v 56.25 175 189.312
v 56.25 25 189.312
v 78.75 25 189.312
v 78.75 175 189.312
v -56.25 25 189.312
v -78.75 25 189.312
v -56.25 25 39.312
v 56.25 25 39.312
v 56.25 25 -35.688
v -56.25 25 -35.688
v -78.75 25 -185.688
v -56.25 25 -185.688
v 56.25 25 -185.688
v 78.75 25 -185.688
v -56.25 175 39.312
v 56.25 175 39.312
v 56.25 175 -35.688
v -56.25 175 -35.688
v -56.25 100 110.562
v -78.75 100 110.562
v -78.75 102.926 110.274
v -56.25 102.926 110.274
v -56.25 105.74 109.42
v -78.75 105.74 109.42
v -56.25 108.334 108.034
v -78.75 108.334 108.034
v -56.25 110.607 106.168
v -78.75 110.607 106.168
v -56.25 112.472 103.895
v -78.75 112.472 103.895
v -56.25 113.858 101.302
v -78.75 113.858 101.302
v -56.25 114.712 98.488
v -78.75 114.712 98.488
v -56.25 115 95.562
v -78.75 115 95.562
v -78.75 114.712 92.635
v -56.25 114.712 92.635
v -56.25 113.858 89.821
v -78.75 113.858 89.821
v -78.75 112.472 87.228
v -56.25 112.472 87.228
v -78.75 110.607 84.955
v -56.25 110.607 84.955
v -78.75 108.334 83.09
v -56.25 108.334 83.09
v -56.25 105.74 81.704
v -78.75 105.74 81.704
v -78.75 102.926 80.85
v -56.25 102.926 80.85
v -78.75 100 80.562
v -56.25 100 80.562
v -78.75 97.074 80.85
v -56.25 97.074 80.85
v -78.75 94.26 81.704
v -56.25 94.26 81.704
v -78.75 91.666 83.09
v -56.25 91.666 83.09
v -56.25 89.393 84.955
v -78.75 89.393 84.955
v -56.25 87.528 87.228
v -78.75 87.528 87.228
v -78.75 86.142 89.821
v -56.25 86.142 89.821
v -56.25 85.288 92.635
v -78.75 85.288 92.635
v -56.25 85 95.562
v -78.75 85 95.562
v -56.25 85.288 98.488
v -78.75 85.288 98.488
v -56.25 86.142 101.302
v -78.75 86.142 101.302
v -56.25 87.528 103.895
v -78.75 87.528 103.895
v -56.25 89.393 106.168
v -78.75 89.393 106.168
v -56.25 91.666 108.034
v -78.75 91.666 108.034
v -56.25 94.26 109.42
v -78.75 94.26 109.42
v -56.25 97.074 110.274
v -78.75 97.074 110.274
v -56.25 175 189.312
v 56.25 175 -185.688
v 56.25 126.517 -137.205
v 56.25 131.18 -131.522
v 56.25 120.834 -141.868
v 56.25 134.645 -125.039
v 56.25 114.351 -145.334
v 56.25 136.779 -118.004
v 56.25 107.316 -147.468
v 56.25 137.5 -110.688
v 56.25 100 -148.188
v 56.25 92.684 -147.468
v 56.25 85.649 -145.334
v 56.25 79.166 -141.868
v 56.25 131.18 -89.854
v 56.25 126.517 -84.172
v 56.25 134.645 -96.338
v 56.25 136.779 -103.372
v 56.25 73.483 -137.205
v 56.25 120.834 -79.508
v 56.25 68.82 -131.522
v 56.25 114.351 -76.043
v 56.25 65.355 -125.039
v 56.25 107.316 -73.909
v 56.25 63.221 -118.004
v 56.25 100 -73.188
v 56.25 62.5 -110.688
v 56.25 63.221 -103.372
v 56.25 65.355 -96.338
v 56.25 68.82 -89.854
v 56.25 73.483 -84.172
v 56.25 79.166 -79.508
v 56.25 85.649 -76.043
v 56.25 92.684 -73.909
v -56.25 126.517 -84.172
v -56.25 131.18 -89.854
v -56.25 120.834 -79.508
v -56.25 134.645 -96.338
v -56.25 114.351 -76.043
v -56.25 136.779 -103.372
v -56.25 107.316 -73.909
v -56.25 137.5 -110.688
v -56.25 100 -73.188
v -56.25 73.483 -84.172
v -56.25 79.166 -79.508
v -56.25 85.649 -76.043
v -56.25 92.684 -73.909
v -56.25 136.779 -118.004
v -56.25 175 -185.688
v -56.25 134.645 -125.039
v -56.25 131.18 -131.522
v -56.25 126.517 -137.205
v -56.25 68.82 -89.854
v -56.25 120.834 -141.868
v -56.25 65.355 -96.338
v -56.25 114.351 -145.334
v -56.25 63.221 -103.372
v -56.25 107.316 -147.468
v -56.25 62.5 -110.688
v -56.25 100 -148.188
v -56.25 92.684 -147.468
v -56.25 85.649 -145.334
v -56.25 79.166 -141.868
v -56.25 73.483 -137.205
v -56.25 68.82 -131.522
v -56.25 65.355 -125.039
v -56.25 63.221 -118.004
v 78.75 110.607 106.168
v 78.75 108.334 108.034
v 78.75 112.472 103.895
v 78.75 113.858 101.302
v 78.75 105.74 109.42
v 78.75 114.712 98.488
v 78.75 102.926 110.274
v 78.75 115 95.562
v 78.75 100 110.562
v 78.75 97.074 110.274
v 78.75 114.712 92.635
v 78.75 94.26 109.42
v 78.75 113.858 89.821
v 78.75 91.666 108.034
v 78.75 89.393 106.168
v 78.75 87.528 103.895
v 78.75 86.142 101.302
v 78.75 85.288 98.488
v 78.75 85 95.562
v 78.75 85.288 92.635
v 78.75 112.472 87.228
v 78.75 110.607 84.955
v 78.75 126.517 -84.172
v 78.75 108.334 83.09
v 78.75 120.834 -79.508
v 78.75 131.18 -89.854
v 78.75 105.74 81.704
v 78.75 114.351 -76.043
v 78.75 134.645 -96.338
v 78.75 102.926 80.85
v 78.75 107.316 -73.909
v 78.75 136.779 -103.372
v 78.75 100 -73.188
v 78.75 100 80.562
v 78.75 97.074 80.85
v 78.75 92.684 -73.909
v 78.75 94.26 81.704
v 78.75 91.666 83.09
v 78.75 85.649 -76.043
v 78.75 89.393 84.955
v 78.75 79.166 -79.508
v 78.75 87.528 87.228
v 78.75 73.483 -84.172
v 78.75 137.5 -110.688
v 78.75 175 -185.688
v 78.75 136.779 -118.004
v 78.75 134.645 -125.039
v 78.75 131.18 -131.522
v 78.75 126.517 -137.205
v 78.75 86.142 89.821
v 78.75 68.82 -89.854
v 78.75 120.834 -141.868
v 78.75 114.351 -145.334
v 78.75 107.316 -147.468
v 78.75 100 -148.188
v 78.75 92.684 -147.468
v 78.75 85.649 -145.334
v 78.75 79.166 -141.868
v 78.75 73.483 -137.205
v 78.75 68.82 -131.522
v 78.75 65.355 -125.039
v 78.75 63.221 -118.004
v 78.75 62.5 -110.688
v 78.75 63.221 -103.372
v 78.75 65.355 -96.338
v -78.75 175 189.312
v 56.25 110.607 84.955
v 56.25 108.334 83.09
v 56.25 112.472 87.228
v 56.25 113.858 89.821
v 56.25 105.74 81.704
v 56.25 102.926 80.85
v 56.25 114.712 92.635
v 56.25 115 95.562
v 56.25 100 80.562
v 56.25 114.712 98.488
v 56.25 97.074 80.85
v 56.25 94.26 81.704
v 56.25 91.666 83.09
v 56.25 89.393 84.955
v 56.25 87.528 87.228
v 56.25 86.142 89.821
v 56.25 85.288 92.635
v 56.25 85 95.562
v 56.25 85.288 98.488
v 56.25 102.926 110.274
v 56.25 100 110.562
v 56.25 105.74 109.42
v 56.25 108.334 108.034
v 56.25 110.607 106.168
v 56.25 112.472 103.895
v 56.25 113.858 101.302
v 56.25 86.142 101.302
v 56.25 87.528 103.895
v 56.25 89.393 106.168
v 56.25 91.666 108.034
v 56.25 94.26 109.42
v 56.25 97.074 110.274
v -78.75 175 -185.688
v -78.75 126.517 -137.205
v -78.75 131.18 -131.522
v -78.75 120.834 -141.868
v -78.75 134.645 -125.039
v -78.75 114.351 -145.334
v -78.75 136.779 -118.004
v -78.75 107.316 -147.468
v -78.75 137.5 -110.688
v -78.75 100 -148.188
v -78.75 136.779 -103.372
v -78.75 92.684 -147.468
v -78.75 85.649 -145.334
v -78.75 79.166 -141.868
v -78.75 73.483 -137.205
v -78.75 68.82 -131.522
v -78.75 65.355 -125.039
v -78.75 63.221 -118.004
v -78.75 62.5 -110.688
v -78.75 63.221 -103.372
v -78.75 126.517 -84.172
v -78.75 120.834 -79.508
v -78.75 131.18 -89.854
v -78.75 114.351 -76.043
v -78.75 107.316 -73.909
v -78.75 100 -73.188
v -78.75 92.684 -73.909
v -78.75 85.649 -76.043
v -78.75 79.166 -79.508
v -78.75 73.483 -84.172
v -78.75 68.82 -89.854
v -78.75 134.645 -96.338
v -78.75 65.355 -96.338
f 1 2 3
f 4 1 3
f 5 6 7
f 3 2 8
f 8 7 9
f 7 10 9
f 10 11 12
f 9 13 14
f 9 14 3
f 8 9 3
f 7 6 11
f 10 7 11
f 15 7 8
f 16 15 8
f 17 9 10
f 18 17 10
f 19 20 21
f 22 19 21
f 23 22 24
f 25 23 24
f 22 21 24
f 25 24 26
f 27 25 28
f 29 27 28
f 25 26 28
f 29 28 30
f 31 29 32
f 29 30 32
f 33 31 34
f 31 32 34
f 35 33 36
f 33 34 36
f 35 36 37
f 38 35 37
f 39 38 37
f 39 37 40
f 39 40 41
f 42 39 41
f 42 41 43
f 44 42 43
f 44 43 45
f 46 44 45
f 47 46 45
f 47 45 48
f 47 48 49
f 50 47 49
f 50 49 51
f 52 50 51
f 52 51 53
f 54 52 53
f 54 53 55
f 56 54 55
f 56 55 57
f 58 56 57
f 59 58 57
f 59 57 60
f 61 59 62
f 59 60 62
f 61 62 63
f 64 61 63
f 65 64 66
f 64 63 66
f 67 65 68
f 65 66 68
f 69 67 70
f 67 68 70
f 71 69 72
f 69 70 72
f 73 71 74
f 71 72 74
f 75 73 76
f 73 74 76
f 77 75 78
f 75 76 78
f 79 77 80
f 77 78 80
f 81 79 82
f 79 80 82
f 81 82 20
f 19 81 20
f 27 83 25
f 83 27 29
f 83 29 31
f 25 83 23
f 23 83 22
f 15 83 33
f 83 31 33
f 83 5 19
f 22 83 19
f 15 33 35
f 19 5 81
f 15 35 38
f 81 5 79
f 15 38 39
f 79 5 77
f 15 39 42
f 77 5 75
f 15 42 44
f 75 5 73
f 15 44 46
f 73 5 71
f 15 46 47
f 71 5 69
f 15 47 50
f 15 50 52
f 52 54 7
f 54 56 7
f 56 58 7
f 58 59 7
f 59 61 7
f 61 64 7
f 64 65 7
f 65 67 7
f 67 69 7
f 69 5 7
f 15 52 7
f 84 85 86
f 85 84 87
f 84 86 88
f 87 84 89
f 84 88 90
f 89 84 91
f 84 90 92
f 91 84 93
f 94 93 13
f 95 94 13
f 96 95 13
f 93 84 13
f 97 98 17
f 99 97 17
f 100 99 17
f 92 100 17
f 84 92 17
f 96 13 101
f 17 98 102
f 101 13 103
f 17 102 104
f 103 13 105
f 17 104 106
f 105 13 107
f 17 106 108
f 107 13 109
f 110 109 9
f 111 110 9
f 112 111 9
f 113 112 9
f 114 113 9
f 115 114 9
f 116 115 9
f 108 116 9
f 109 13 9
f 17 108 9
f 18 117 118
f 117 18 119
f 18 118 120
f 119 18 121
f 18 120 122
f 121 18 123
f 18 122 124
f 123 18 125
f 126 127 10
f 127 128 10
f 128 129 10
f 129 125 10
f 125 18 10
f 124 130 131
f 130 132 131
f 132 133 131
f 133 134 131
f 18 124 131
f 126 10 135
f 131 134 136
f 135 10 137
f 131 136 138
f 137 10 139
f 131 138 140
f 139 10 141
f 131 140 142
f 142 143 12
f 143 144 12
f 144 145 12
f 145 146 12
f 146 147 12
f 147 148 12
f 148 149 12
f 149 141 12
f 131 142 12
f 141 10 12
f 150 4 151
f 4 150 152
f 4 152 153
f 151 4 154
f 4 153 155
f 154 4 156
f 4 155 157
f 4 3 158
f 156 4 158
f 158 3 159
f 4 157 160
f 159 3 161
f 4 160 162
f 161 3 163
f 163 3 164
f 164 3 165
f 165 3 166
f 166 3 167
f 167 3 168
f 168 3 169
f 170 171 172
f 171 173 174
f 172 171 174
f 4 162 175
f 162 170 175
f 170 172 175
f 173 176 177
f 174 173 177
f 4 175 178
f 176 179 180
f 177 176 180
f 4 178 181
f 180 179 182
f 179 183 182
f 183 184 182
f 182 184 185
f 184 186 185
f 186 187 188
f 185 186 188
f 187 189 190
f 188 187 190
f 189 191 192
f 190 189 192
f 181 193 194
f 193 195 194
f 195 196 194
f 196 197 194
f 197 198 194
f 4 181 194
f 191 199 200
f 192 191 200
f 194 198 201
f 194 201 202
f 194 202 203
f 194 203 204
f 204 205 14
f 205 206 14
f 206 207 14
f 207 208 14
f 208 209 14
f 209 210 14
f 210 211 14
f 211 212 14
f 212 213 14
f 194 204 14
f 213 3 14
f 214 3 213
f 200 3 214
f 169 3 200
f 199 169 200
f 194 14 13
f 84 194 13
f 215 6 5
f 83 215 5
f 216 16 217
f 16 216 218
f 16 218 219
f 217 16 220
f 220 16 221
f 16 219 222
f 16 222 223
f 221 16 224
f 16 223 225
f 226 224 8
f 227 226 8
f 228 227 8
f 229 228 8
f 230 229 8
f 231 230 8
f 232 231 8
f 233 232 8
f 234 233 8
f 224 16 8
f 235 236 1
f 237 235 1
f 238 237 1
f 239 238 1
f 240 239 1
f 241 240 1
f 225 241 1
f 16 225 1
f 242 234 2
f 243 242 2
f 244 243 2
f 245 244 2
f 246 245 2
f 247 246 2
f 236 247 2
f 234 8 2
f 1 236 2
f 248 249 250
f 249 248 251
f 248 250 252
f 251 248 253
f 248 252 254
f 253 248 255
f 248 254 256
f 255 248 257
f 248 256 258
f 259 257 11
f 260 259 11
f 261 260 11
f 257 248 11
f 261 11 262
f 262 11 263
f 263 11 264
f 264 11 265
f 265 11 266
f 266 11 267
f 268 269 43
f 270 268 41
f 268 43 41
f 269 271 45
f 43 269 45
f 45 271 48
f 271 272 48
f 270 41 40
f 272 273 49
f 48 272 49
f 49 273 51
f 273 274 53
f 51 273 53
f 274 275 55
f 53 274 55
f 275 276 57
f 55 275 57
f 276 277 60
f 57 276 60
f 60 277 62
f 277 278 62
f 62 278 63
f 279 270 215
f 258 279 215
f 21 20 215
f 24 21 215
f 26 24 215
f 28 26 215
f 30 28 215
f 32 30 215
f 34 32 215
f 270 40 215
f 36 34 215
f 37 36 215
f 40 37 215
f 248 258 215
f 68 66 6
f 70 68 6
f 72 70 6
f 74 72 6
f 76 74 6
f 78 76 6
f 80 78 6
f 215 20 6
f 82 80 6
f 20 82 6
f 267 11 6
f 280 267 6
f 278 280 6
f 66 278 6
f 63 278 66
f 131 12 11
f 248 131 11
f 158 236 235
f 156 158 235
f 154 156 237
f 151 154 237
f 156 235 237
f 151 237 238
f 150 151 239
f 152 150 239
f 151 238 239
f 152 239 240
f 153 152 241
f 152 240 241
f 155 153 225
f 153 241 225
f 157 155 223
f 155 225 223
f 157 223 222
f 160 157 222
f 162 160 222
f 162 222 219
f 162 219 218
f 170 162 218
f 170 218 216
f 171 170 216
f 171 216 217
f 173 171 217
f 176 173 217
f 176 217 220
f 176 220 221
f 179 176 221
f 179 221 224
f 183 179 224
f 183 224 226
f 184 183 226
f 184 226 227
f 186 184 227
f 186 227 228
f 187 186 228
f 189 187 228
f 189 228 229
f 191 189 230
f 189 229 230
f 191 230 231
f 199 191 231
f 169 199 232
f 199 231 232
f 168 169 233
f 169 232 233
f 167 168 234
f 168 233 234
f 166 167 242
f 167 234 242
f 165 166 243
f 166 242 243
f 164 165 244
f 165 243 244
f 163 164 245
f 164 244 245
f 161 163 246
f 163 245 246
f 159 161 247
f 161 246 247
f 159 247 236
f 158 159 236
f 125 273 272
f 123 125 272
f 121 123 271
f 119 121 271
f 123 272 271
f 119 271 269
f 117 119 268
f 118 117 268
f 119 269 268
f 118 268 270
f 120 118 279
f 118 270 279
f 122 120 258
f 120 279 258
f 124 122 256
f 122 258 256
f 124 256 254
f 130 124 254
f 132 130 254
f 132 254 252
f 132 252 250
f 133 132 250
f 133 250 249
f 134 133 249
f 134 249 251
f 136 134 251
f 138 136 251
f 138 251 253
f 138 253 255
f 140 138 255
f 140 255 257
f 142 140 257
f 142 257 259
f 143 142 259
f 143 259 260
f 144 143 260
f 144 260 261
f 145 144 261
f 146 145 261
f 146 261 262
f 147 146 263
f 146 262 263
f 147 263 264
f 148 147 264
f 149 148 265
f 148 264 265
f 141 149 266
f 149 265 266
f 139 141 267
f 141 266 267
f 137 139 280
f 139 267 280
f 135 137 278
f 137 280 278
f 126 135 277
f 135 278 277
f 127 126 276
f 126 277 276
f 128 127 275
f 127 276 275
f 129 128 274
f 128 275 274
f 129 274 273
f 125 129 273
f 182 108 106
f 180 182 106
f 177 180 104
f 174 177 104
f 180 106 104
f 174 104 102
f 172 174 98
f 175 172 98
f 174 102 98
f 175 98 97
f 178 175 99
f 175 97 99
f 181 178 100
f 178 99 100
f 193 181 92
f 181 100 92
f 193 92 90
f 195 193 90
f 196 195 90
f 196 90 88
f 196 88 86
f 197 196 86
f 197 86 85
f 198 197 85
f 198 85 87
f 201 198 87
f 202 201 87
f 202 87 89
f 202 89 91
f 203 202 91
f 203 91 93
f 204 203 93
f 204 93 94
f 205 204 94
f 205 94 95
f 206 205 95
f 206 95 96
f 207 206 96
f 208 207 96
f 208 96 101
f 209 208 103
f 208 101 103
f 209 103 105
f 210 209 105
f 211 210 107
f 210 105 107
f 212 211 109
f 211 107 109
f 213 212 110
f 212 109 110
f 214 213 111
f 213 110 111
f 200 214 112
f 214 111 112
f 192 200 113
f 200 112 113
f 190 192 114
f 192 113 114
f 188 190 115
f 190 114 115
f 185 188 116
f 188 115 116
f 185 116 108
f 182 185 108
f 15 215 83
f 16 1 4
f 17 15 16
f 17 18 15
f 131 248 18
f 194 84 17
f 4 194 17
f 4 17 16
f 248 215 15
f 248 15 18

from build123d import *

# Parameters (mm, degrees)
BOSS_EXTRUDE1_DEPTH = 200
SKETCH4_R           = 20
SKETCH4_R_2         = 50
CUT_EXTRUDE1_DEPTH  = 313
SCALE1_SCALE        = 0.75


with BuildPart() as part:
    # Sketch1 → Boss-Extrude1 (new body)
    with BuildSketch(Plane(origin=(0, 0, 0), x_dir=(1, 0, 0), z_dir=(0, 1, 0))):
        Polygon((75, -250), (105, -250), (105, 250), (75, 250), (75, 50), (-75, 50), (-75, 250), (-105, 250), (-105, -250), (-75, -250), (-75, -50), (75, -50), align=None)
    extrude(amount=BOSS_EXTRUDE1_DEPTH)

    # Sketch4 → Cut-Extrude1 (cut)
    with BuildSketch(Plane.ZY.offset(105)):
        with Locations((125, 100)):
            Circle(SKETCH4_R)
        with Locations((-150, 100)):
            Circle(SKETCH4_R_2)
    extrude(amount=-CUT_EXTRUDE1_DEPTH, mode=Mode.SUBTRACT)


with BuildPart() as part_1:
    # Scale1: scaled about (0, 100, 7.246945107)
    add(part.part.scale(SCALE1_SCALE).moved(Location((0, 25, 1.811736277))))


solid = part_1.part
